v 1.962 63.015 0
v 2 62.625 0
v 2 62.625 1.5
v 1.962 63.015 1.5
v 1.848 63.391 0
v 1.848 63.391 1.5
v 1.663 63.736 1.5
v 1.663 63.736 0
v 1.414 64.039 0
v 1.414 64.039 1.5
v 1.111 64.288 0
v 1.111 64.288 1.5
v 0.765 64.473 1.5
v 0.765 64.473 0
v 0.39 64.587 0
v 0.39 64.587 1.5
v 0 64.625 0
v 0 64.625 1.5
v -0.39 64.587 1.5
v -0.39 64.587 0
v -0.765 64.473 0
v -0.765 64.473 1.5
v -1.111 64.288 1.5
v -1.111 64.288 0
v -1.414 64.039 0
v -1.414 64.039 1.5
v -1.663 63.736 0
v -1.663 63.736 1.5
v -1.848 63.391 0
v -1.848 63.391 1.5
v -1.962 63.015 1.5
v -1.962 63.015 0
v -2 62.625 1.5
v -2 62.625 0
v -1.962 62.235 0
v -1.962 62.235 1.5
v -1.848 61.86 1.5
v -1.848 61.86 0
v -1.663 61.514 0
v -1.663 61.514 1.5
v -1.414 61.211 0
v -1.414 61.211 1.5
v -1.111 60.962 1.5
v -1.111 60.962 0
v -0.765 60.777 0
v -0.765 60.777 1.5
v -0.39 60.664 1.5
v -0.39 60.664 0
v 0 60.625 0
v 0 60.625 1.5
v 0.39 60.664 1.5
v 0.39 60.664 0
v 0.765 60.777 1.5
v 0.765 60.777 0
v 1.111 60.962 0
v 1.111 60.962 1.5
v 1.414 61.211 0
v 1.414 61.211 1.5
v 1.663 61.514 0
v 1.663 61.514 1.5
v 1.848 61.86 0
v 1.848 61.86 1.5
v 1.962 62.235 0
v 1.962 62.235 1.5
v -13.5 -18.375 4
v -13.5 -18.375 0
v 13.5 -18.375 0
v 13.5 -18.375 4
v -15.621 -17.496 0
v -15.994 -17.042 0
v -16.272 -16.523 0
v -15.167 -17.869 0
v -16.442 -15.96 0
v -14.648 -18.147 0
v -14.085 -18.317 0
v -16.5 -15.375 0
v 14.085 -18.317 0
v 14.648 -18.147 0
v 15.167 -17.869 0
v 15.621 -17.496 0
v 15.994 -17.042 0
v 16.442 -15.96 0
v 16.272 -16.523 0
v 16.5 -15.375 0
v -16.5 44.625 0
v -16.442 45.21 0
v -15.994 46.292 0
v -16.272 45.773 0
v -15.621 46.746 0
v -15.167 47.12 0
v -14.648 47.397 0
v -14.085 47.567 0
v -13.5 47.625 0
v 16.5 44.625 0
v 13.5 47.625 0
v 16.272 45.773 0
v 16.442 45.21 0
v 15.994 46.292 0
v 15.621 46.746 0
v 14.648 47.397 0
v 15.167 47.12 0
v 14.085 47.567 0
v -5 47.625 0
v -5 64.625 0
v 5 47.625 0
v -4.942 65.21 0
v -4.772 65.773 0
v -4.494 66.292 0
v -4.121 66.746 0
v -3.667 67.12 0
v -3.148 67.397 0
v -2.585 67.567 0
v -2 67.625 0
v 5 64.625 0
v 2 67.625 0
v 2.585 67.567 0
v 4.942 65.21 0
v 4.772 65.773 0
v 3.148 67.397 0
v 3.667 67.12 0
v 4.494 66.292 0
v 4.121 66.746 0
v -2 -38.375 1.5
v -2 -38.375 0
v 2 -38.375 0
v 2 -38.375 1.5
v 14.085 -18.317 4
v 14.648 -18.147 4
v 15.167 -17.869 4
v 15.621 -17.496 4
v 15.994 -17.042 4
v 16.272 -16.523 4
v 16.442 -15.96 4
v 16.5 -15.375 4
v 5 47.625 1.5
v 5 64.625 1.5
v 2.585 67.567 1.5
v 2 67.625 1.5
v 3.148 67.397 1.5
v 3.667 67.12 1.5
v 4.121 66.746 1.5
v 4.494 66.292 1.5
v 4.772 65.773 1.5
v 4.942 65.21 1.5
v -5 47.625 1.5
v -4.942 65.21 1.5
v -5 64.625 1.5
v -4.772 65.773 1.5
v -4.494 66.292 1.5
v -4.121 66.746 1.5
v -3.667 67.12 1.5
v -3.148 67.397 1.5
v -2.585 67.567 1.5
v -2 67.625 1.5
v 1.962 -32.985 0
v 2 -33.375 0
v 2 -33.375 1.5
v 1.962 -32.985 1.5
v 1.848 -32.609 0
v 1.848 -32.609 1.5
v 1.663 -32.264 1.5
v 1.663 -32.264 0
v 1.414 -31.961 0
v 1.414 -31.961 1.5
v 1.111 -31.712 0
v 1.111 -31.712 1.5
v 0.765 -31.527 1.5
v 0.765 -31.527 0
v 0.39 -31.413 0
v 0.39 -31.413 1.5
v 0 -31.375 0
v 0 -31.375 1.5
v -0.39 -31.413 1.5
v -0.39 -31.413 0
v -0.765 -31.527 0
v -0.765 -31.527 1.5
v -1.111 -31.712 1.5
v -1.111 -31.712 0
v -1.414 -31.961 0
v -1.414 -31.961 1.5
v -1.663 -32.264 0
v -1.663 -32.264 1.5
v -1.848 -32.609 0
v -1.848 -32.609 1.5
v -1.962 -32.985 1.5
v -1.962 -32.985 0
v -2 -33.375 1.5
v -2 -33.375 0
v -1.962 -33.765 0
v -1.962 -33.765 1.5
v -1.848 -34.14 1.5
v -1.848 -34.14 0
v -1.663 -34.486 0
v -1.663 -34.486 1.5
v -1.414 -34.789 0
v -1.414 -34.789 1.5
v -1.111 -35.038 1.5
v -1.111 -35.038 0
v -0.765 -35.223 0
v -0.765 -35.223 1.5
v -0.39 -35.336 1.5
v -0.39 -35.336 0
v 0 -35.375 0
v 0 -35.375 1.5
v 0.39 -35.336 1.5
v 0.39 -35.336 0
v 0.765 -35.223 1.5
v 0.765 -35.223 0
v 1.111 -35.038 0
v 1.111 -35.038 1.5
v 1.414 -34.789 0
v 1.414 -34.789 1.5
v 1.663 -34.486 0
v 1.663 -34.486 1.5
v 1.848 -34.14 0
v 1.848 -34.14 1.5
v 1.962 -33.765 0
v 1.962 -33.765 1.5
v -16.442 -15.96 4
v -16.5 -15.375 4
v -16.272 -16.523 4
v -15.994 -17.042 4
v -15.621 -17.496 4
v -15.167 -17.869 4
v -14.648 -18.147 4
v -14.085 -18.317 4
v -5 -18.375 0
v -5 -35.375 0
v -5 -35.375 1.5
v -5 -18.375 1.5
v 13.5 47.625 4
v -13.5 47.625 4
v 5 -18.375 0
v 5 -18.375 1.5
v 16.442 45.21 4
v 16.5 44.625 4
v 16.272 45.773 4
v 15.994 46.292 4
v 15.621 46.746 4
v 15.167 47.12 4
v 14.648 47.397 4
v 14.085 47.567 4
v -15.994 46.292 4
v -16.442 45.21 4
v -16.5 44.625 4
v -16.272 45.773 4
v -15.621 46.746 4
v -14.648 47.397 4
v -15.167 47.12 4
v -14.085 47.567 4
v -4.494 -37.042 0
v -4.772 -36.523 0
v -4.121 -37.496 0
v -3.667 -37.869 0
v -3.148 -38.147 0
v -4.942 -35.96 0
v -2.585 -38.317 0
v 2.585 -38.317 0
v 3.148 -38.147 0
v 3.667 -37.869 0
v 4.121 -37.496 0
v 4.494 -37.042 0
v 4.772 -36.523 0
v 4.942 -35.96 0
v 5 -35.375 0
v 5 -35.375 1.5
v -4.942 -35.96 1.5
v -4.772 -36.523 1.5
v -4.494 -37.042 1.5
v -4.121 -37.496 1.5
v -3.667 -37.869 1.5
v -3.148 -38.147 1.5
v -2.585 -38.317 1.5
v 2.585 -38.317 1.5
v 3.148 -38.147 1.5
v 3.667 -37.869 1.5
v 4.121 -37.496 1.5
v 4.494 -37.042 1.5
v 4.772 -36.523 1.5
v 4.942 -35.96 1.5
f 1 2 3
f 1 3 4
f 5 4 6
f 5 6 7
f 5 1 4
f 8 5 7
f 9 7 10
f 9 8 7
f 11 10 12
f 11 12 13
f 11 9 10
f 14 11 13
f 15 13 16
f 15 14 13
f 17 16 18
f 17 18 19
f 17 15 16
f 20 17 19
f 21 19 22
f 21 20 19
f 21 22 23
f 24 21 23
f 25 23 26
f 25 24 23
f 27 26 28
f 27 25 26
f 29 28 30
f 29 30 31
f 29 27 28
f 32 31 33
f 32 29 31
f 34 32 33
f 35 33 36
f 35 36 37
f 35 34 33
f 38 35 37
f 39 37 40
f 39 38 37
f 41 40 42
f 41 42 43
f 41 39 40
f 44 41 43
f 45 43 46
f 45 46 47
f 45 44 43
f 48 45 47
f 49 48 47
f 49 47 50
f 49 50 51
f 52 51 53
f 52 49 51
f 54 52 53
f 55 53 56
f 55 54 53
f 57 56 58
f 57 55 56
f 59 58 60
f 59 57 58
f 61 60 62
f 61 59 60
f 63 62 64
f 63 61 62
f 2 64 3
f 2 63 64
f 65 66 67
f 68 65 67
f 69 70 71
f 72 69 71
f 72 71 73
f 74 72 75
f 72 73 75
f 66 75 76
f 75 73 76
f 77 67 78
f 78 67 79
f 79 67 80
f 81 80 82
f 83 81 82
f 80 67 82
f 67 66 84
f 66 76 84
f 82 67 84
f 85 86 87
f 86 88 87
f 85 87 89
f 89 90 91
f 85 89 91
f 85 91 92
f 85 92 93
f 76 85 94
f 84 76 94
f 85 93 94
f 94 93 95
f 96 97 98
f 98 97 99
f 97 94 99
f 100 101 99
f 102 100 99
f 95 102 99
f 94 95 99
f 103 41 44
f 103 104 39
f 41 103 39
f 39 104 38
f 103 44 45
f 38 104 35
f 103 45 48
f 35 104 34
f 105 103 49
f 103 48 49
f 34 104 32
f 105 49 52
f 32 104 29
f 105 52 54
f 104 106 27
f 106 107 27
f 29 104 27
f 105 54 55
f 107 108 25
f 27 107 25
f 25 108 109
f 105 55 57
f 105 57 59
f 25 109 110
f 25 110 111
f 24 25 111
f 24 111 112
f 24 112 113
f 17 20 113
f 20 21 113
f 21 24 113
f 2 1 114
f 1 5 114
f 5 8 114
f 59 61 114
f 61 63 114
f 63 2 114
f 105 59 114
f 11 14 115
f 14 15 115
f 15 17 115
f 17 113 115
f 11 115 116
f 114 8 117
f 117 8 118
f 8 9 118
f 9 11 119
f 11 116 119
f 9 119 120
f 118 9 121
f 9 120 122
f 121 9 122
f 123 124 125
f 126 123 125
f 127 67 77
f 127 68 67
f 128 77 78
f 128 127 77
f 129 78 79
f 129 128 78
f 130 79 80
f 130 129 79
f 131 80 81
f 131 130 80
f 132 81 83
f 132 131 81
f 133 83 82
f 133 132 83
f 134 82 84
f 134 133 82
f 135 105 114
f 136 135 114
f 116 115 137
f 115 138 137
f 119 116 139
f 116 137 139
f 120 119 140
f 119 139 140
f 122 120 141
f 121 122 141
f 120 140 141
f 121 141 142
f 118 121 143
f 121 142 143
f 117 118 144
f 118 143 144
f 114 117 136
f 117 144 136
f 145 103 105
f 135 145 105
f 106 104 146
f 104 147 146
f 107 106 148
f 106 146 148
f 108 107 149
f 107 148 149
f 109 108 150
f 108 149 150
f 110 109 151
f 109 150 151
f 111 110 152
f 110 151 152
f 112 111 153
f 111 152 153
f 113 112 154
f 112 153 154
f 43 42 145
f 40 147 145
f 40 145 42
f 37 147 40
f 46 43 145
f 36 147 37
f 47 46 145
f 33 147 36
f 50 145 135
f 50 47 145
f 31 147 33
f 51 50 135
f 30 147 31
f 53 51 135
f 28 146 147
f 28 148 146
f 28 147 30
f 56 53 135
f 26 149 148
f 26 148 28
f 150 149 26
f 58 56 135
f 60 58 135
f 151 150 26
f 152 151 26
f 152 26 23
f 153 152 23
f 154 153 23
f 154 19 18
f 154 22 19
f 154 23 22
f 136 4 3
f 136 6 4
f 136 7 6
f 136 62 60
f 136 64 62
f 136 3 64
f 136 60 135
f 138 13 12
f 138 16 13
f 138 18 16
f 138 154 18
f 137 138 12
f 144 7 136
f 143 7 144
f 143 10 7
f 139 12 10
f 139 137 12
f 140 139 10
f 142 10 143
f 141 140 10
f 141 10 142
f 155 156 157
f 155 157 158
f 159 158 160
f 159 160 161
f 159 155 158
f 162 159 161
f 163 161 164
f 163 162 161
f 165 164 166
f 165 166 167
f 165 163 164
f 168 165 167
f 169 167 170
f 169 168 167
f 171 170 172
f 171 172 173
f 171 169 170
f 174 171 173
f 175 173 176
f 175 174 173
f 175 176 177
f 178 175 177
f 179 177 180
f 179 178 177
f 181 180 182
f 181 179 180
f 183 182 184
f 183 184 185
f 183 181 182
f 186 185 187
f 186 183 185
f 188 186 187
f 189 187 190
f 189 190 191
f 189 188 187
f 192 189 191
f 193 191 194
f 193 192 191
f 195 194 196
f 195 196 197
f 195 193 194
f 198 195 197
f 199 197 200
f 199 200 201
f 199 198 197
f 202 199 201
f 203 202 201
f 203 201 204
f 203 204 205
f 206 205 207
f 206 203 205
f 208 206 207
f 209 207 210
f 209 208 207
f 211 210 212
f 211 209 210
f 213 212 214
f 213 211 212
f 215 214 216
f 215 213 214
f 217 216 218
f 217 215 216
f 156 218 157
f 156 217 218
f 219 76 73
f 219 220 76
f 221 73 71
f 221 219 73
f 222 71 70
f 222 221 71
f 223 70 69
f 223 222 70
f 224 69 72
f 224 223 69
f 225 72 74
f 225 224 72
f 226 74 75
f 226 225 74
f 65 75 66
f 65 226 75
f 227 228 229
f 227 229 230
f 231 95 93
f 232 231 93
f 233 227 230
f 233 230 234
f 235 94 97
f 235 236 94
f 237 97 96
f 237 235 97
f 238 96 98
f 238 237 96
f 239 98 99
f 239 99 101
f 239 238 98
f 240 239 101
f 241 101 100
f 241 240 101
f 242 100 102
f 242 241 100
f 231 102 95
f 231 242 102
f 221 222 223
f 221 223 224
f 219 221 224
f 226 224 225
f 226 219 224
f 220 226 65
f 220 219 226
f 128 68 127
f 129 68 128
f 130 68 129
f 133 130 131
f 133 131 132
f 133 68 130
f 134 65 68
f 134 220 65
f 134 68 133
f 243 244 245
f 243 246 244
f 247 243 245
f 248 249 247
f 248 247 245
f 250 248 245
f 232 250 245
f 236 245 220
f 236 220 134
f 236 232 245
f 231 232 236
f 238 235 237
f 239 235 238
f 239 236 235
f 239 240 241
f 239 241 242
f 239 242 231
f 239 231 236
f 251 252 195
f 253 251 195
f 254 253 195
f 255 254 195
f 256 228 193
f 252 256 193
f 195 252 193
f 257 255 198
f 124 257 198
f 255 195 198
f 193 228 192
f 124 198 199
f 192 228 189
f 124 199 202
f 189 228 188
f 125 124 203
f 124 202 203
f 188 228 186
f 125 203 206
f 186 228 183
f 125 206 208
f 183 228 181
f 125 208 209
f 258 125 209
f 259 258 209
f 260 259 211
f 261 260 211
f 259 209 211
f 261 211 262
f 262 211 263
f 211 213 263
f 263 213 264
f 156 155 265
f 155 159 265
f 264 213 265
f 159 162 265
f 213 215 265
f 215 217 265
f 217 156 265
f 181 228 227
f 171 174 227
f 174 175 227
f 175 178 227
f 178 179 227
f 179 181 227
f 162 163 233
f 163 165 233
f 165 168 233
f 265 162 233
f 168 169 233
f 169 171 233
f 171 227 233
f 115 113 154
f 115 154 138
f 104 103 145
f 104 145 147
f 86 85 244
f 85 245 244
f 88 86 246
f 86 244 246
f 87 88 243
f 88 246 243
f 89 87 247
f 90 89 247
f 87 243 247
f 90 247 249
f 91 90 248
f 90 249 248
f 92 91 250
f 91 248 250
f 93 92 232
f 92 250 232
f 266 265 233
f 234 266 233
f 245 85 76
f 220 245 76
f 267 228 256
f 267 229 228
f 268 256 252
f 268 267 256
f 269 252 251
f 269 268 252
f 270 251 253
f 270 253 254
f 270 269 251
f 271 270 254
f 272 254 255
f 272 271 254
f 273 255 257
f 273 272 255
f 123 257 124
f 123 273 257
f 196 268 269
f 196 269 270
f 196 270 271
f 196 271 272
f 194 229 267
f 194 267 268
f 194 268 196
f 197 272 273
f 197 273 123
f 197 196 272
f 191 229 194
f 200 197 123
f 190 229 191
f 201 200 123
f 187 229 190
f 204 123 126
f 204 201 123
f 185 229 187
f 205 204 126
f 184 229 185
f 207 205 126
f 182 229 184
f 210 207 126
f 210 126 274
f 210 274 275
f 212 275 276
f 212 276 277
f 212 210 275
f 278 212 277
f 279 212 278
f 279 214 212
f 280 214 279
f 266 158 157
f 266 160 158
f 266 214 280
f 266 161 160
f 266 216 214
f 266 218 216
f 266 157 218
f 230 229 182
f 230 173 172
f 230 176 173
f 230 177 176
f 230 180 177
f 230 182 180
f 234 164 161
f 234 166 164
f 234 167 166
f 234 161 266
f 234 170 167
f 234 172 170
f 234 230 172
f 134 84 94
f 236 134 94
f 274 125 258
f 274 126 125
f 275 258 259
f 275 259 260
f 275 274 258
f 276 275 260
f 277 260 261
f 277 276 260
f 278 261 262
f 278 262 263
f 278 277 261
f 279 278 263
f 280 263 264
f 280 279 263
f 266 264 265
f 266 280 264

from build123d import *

# Parameters (mm, degrees)
F0_W     = 10
F0_H     = 20
F0_R     = 2
F1_DEPTH = 1.5
F2_DEPTH = 4
F3_R     = 3
F3_2_R   = 3


with BuildPart() as f1:
    # F0 (on Top) → F1 (new body)
    with BuildSketch(Plane.XY):
        with Locations((0, 57.625134)):
            Rectangle(F0_W, F0_H)
        with Locations((0, 62.625134)):
            Circle(F0_R, mode=Mode.SUBTRACT)
        with Locations((0, -28.374866)):
            Rectangle(F0_W, F0_H)
        with Locations((0, -33.374866)):
            Circle(F0_R, mode=Mode.SUBTRACT)
    extrude(amount=F1_DEPTH)

    # F3#2
    f3_2_edges = [f1.edges().sort_by_distance(p)[0] for p in [
        (-5, -38.374866, 0.75),
        (5, -38.374866, 0.75),
        (5, 67.625134, 0.75),
        (-5, 67.625134, 0.75),
    ]]
    fillet(f3_2_edges, radius=F3_2_R)


with BuildPart() as f2:
    # F0 (on Top) → F2 (new body)
    with BuildSketch(Plane.XY):
        Polygon((-5, 47.625134), (-16.5, 47.625134), (-16.5, -18.374866), (-5, -18.374866), (5, -18.374866), (16.5, -18.374866), (16.5, 47.625134), (5, 47.625134), align=None)
    extrude(amount=F2_DEPTH)

    # F3
    f3_edges = [f2.edges().sort_by_distance(p)[0] for p in [
        (16.5, 47.625134, 2),
        (-16.5, 47.625134, 2),
        (-16.5, -18.374866, 2),
        (16.5, -18.374866, 2),
    ]]
    fillet(f3_edges, radius=F3_R)


solid = Compound([f1.part, f2.part])
